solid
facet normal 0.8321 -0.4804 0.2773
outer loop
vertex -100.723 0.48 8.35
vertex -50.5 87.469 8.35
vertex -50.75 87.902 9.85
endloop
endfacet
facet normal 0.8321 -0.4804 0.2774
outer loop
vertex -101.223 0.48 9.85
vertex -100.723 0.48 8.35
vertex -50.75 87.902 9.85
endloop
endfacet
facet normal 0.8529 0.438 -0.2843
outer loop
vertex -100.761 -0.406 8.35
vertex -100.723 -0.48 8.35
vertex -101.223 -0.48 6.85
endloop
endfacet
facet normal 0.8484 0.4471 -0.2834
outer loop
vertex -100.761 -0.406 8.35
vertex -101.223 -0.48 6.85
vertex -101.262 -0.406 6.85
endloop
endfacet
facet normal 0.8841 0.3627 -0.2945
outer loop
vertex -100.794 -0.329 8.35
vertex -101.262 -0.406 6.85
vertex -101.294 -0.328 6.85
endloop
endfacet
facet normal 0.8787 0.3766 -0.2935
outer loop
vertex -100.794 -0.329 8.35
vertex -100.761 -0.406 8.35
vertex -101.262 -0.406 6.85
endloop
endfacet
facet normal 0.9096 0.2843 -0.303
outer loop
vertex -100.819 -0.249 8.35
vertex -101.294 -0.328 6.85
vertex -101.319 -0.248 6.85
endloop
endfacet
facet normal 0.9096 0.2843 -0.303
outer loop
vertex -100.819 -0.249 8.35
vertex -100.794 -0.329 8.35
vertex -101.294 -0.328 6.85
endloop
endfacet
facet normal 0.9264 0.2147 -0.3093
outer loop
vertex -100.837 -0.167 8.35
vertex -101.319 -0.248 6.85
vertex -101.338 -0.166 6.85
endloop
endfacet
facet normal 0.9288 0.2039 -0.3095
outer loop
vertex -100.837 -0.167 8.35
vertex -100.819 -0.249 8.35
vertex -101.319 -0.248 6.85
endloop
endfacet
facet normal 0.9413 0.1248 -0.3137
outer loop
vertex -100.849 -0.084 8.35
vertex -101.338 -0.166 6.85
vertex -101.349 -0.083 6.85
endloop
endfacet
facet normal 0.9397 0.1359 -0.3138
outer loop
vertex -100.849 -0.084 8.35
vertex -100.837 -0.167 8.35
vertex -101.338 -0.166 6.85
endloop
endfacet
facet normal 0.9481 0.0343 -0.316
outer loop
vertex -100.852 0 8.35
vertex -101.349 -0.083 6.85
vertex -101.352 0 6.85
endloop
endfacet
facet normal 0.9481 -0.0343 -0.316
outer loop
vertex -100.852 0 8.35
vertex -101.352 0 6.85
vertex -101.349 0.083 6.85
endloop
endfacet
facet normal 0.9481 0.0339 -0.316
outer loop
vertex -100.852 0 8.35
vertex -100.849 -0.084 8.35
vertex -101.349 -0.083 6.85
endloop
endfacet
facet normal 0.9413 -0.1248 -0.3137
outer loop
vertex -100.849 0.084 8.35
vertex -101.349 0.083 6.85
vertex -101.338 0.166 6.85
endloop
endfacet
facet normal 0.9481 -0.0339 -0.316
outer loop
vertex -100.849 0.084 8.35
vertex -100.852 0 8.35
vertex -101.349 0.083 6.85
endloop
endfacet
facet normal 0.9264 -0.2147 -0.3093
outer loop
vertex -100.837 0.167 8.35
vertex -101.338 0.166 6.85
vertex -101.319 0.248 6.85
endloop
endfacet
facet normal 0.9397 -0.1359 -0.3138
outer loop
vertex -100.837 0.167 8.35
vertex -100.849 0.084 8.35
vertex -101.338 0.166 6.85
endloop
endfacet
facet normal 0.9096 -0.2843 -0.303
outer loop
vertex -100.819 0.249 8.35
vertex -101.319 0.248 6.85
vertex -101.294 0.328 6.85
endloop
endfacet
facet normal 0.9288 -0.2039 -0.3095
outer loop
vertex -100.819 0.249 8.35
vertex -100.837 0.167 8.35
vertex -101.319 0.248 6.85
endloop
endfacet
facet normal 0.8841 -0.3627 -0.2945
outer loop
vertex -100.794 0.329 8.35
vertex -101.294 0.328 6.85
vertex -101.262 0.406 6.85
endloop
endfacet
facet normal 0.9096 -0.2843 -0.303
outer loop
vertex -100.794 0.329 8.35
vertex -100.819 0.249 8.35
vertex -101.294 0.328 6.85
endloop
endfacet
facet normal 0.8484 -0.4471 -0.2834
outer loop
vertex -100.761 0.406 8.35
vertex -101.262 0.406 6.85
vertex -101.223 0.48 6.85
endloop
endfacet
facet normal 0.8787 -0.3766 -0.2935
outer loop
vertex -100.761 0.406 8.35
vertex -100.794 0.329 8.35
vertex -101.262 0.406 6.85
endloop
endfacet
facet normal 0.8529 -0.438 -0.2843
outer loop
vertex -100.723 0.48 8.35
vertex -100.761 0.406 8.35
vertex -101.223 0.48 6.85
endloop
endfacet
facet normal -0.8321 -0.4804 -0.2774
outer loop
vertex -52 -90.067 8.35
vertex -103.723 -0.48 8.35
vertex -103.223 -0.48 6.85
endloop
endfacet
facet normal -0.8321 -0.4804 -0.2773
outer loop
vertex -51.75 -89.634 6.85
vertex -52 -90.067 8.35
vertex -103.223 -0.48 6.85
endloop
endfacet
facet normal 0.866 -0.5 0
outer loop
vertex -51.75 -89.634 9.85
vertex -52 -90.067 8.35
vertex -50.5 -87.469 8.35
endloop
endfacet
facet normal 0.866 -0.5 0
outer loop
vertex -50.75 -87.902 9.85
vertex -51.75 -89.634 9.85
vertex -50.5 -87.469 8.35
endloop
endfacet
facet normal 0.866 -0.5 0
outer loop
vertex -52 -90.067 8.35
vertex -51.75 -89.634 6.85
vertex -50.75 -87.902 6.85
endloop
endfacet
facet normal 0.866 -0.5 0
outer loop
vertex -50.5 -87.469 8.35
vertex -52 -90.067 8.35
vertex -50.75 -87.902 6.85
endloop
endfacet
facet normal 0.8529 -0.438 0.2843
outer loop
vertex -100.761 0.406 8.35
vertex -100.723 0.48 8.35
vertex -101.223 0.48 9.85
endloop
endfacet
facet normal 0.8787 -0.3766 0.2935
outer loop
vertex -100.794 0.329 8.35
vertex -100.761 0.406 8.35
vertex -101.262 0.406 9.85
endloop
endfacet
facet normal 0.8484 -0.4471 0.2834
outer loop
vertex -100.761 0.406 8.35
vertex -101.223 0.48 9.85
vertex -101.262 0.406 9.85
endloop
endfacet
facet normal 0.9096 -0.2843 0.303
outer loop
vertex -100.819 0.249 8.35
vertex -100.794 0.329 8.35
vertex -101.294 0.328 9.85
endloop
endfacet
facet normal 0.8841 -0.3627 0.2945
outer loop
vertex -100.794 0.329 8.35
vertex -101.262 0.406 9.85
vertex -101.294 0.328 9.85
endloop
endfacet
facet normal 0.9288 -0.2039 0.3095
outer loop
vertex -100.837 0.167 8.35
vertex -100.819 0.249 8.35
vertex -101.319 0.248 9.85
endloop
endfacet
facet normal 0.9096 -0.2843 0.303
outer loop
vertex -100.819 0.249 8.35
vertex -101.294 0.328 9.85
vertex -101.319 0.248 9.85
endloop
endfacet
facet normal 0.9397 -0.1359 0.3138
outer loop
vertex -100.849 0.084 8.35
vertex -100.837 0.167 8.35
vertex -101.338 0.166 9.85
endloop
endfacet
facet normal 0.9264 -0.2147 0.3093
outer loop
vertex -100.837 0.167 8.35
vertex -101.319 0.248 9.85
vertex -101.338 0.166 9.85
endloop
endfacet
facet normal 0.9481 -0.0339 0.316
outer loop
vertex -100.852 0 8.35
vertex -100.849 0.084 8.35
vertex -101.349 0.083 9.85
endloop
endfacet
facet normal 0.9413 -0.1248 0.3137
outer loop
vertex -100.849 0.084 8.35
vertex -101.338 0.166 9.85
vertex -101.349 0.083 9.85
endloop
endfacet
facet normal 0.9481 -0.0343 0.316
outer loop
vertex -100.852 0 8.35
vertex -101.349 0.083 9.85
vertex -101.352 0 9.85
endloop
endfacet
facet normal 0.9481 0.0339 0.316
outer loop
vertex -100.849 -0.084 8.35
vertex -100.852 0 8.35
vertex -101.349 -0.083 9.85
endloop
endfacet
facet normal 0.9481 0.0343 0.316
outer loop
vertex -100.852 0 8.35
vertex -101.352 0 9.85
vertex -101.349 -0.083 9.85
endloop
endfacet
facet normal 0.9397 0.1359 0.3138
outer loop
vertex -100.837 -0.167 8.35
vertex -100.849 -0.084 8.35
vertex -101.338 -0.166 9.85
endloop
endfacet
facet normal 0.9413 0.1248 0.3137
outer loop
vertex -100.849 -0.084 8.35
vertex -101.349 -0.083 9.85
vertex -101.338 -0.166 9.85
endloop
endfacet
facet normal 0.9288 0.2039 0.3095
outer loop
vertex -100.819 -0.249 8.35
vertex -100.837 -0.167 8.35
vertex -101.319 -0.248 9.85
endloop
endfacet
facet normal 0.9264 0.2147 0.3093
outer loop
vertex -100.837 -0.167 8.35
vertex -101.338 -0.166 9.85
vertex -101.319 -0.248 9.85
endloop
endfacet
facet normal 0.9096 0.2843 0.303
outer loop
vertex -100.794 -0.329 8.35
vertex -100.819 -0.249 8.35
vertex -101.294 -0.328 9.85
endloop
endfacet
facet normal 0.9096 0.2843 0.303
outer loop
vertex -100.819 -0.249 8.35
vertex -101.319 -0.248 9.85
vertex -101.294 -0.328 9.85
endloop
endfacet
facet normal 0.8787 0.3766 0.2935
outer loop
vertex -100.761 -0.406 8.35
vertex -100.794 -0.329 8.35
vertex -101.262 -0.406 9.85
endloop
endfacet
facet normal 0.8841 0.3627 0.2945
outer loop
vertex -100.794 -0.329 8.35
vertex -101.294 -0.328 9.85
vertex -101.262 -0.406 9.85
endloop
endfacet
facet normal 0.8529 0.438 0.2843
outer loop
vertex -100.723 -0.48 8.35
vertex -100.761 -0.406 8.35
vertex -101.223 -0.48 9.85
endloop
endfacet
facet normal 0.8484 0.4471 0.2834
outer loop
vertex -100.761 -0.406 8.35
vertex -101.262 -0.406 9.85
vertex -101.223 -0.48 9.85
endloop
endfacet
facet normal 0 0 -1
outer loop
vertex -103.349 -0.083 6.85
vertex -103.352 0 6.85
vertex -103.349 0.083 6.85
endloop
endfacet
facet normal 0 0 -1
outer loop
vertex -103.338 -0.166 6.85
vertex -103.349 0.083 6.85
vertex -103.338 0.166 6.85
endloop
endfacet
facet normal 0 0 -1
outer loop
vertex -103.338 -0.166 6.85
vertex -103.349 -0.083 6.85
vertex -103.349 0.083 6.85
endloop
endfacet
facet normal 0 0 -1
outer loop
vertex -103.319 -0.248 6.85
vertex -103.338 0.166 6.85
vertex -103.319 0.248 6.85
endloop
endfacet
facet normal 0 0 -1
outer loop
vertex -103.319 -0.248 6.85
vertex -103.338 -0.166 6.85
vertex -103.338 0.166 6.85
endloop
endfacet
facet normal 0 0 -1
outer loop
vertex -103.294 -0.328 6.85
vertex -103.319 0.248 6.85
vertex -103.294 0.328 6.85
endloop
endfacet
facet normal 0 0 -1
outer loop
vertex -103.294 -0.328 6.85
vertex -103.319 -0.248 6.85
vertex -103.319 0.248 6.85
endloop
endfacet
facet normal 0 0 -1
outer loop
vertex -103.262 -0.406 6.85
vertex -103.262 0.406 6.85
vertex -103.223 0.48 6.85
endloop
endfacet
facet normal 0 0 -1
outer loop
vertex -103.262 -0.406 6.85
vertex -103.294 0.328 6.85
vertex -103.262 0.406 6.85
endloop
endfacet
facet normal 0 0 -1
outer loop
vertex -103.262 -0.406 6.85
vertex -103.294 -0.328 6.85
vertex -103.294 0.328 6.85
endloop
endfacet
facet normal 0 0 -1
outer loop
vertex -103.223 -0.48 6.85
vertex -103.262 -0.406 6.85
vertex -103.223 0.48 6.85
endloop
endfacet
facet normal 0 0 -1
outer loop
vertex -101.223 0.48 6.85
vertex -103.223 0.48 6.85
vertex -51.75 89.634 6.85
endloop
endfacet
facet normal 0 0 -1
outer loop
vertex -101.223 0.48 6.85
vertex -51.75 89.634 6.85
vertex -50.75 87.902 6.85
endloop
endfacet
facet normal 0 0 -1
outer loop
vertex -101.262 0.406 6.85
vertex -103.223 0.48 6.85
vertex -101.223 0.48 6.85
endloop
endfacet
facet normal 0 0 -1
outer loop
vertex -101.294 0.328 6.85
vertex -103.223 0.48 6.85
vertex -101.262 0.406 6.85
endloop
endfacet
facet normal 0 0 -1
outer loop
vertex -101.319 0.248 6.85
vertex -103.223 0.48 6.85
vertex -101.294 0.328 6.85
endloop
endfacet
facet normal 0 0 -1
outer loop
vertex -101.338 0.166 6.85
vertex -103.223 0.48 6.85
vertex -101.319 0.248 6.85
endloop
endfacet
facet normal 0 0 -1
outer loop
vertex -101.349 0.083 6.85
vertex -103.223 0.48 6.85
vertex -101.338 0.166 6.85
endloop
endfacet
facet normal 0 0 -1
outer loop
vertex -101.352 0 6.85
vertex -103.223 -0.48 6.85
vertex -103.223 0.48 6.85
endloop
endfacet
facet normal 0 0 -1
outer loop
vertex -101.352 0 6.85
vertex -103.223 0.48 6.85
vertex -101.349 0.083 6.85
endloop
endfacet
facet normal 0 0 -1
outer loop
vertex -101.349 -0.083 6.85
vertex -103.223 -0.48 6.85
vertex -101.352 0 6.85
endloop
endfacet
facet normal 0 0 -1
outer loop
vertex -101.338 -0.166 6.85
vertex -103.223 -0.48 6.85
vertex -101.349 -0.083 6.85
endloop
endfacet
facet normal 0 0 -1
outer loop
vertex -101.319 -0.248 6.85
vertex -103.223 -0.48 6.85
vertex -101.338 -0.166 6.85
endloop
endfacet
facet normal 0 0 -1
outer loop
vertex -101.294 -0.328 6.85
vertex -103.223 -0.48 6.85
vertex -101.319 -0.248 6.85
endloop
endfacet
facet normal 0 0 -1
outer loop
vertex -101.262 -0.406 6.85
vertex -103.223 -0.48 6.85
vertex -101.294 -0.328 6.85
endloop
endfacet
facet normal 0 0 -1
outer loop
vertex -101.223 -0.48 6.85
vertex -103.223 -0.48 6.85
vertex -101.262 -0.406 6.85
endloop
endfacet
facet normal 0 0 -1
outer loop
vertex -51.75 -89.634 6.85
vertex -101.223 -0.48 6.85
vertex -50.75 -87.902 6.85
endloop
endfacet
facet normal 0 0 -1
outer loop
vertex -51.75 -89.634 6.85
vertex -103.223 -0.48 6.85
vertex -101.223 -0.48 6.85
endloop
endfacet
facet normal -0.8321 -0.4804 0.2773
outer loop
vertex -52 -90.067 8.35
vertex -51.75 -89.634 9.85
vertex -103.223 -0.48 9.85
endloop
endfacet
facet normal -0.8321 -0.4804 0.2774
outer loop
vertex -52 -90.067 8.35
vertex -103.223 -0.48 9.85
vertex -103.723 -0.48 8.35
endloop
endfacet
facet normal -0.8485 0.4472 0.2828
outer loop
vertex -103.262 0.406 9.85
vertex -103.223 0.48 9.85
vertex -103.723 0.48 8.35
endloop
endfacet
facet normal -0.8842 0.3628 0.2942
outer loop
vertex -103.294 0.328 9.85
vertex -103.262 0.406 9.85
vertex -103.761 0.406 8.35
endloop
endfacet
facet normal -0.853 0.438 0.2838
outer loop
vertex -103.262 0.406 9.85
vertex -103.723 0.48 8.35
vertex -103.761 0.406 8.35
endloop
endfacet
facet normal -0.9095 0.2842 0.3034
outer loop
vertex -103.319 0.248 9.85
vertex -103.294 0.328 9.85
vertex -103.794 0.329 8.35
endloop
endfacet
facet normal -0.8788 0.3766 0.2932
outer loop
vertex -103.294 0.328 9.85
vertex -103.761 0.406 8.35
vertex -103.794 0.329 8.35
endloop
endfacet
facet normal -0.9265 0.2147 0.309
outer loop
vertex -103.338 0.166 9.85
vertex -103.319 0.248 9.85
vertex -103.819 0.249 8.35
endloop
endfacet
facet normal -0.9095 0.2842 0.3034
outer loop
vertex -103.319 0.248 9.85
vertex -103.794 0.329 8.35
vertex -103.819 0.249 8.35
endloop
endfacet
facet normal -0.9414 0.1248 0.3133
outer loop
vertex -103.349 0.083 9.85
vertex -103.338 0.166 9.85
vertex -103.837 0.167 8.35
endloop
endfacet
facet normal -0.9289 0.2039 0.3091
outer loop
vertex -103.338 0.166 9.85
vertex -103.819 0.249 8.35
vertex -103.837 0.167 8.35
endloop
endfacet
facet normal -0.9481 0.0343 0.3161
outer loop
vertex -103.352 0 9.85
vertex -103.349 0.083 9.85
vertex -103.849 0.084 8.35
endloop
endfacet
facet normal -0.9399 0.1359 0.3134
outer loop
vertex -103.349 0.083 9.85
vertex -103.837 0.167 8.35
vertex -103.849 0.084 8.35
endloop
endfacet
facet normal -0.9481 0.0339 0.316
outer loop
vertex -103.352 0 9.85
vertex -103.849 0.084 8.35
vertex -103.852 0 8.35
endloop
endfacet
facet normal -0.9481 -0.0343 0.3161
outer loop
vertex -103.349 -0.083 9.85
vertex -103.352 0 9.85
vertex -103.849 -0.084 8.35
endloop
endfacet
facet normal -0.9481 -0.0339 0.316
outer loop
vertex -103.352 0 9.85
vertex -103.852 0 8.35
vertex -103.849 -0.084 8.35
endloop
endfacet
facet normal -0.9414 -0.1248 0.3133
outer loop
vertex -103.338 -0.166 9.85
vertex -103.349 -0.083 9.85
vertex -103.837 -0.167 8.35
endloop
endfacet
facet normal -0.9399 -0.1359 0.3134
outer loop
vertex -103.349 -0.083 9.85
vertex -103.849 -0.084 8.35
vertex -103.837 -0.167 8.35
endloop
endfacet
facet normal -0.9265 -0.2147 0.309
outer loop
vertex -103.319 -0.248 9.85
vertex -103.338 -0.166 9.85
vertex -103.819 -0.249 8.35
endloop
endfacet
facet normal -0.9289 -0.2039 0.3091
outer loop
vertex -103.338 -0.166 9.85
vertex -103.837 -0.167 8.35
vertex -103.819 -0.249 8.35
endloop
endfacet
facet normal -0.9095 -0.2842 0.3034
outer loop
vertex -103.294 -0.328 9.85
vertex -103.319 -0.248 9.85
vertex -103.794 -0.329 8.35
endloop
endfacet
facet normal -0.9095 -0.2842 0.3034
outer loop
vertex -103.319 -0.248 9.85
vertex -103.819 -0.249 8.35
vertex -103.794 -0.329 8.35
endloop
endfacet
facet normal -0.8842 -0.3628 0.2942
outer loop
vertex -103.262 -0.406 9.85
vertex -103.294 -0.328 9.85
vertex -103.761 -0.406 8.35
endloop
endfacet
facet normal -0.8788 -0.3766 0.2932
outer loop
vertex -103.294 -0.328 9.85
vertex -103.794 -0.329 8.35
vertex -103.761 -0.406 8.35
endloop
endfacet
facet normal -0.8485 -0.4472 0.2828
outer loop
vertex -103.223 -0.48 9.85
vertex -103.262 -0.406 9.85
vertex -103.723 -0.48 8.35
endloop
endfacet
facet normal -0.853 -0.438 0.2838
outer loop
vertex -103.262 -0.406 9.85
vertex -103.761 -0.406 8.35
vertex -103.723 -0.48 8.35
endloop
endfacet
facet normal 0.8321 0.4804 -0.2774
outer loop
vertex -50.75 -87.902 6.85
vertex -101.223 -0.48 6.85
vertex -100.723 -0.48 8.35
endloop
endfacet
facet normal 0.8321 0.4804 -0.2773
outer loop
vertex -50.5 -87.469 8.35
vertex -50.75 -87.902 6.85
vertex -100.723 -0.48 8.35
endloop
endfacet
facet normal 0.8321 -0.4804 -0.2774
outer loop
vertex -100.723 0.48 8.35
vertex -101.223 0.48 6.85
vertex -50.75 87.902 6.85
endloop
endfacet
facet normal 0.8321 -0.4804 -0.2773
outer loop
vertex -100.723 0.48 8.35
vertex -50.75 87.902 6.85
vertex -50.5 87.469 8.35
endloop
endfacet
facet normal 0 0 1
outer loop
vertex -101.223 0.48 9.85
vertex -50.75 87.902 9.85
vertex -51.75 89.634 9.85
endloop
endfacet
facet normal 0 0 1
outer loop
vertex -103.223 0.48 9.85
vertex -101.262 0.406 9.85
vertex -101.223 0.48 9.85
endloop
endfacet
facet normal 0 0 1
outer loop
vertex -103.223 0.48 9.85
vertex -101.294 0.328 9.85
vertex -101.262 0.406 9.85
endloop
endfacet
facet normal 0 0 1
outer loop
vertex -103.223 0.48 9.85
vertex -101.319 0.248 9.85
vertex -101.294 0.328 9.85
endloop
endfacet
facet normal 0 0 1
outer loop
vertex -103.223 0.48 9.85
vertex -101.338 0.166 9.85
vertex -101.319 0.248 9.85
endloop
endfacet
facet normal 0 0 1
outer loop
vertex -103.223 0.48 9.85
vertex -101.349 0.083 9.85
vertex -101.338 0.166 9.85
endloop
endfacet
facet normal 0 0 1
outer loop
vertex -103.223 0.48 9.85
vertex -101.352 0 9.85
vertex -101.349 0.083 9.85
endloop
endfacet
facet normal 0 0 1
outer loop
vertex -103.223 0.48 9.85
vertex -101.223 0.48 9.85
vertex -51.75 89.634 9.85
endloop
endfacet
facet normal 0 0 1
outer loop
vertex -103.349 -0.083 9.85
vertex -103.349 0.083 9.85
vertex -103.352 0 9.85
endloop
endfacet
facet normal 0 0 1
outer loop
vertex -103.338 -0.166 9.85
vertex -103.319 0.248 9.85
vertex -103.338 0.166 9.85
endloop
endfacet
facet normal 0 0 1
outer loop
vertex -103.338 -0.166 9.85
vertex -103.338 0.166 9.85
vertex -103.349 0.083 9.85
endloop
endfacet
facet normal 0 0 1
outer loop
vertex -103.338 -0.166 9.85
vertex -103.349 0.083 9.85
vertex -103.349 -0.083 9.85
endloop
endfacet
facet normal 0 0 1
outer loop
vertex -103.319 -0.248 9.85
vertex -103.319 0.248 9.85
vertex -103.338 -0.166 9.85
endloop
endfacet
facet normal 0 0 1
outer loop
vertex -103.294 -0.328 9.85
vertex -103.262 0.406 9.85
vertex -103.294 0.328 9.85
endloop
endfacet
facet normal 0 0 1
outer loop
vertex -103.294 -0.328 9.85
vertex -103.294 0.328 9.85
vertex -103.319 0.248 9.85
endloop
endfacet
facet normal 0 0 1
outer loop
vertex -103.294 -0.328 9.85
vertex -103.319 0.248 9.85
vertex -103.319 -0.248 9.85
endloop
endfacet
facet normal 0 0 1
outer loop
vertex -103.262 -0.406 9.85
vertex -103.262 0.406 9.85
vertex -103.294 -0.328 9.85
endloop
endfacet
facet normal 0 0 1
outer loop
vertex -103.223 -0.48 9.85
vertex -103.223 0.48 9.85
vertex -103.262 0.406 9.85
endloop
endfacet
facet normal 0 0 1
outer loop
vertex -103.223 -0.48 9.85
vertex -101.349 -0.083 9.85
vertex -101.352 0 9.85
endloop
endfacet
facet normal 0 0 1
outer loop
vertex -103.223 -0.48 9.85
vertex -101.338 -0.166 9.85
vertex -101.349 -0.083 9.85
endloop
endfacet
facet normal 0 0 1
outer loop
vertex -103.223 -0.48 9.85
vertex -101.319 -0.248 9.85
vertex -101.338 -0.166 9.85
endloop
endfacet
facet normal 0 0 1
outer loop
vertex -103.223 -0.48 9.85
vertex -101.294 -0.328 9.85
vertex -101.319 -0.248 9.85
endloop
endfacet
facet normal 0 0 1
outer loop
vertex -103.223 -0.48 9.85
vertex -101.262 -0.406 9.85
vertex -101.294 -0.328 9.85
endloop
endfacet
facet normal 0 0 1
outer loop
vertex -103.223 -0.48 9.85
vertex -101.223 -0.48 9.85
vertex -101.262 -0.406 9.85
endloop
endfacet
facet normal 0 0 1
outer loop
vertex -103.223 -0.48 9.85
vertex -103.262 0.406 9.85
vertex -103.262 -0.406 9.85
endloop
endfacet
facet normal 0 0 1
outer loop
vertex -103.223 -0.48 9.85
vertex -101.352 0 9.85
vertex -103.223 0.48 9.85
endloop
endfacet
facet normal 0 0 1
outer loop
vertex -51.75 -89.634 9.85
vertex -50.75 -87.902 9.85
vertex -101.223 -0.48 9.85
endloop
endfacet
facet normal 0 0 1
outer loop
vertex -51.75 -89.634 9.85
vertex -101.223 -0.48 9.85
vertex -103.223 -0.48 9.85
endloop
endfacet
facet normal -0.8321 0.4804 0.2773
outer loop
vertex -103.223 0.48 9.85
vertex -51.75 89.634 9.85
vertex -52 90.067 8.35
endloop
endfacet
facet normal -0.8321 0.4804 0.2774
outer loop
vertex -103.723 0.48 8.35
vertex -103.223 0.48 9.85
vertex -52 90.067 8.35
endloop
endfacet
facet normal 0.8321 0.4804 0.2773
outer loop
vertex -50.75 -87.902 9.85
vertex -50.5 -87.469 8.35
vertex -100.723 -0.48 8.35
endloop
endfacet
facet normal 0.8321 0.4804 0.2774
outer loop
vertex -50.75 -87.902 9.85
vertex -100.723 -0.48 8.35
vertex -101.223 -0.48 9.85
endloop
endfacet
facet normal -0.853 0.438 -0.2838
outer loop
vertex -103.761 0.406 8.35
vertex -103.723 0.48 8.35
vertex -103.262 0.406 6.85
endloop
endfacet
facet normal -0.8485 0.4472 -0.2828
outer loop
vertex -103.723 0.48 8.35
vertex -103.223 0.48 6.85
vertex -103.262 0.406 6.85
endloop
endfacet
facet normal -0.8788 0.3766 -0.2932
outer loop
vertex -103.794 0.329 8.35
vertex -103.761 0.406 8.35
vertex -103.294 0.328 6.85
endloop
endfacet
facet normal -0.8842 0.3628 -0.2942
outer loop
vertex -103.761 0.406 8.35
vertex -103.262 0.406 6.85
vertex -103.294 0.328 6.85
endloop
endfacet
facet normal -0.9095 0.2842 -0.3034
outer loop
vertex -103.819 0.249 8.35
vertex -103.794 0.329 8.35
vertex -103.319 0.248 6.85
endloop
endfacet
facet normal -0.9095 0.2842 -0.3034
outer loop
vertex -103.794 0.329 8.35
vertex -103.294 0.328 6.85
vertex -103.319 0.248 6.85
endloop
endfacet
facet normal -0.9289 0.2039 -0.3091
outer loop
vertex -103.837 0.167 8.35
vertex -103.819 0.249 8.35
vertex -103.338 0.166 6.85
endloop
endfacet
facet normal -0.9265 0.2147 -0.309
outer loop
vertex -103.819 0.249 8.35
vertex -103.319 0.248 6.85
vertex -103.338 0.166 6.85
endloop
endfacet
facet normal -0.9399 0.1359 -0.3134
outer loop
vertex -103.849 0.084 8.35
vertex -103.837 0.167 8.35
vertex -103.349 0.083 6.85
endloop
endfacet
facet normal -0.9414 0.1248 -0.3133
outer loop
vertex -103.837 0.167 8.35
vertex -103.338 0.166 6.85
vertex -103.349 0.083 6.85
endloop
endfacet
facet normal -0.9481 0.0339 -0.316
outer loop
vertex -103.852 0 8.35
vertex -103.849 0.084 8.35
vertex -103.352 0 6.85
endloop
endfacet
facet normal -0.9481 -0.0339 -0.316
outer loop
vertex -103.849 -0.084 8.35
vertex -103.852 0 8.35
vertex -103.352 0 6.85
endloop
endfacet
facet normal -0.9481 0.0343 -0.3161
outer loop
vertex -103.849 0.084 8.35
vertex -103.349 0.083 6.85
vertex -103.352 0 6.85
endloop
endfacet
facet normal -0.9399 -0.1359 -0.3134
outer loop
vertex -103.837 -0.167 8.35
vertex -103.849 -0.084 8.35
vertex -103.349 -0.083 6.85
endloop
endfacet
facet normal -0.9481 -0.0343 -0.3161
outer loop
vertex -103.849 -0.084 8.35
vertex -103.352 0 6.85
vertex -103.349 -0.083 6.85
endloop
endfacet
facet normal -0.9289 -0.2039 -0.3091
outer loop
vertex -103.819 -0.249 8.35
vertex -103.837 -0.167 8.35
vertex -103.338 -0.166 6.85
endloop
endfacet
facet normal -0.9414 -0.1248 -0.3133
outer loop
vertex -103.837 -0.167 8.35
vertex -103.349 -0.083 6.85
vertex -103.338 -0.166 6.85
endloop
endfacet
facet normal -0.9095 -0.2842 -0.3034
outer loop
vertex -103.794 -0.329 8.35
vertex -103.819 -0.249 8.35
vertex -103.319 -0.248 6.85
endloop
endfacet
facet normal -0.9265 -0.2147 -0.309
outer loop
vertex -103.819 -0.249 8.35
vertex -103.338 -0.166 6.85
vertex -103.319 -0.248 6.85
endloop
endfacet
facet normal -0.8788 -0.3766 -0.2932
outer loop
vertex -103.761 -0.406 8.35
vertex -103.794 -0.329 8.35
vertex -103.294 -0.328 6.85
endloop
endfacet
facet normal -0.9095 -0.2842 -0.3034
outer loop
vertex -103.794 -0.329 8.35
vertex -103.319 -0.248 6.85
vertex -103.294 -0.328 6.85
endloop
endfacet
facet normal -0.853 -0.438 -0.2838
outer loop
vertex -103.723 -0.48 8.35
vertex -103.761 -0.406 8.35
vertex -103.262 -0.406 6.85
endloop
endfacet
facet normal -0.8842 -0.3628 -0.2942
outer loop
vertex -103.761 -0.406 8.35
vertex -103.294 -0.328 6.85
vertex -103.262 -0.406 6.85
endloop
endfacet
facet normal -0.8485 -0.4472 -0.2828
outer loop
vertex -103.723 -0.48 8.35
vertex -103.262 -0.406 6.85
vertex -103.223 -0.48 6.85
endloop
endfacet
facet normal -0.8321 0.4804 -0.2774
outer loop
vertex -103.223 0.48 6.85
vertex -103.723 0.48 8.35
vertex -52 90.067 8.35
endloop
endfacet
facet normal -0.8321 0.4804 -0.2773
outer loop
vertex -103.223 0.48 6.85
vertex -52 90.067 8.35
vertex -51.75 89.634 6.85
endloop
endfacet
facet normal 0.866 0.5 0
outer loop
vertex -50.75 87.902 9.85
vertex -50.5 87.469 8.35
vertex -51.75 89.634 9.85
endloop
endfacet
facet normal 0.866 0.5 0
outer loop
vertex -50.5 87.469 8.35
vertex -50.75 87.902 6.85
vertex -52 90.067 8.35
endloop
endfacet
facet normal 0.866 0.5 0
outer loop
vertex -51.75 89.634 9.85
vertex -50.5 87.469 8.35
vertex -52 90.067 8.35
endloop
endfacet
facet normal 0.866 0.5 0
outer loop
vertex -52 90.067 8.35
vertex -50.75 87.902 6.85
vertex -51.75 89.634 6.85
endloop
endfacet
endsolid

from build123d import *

# Parameters (mm, degrees)
POCKET_DEPTH = 100
FILLET002_R  = 1


with BuildPart() as part:
    # AdditivePipe: sweep along a path in Sketch005
    with BuildLine(Plane.XY) as additivepipe_path:
        Line((66.666667, 115.470054), (0, 0))
        Line((0, 0), (66.666667, -115.470054))
    # Sketch004 → AdditivePipe (sweep)
    with BuildSketch(Plane.XZ):
        Polygon((-103.5, 6.85), (-104, 8.35), (-103.5, 9.85), (-101.5, 9.85), (-101, 8.35), (-101.5, 6.85), align=None)
    sweep(path=additivepipe_path.line)

    # Sketch006 → Pocket (cut)
    with BuildSketch(Plane.XY):
        Polygon((0, 0), (-115.470054, 200), (34.529946, 200), (150, 0), (34.529946, -200), (-115.470054, -200), align=None)
    extrude(amount=POCKET_DEPTH, mode=Mode.SUBTRACT)

    # Fillet002
    fillet002_edges = [part.edges().sort_by_distance(p)[0] for p in [
        (-103.75, 0, 9.1),
        (-103.75, 0, 7.6),
        (-101.25, 0, 9.1),
        (-101.25, 0, 7.6),
    ]]
    fillet(fillet002_edges, radius=FILLET002_R)


solid = part.part
